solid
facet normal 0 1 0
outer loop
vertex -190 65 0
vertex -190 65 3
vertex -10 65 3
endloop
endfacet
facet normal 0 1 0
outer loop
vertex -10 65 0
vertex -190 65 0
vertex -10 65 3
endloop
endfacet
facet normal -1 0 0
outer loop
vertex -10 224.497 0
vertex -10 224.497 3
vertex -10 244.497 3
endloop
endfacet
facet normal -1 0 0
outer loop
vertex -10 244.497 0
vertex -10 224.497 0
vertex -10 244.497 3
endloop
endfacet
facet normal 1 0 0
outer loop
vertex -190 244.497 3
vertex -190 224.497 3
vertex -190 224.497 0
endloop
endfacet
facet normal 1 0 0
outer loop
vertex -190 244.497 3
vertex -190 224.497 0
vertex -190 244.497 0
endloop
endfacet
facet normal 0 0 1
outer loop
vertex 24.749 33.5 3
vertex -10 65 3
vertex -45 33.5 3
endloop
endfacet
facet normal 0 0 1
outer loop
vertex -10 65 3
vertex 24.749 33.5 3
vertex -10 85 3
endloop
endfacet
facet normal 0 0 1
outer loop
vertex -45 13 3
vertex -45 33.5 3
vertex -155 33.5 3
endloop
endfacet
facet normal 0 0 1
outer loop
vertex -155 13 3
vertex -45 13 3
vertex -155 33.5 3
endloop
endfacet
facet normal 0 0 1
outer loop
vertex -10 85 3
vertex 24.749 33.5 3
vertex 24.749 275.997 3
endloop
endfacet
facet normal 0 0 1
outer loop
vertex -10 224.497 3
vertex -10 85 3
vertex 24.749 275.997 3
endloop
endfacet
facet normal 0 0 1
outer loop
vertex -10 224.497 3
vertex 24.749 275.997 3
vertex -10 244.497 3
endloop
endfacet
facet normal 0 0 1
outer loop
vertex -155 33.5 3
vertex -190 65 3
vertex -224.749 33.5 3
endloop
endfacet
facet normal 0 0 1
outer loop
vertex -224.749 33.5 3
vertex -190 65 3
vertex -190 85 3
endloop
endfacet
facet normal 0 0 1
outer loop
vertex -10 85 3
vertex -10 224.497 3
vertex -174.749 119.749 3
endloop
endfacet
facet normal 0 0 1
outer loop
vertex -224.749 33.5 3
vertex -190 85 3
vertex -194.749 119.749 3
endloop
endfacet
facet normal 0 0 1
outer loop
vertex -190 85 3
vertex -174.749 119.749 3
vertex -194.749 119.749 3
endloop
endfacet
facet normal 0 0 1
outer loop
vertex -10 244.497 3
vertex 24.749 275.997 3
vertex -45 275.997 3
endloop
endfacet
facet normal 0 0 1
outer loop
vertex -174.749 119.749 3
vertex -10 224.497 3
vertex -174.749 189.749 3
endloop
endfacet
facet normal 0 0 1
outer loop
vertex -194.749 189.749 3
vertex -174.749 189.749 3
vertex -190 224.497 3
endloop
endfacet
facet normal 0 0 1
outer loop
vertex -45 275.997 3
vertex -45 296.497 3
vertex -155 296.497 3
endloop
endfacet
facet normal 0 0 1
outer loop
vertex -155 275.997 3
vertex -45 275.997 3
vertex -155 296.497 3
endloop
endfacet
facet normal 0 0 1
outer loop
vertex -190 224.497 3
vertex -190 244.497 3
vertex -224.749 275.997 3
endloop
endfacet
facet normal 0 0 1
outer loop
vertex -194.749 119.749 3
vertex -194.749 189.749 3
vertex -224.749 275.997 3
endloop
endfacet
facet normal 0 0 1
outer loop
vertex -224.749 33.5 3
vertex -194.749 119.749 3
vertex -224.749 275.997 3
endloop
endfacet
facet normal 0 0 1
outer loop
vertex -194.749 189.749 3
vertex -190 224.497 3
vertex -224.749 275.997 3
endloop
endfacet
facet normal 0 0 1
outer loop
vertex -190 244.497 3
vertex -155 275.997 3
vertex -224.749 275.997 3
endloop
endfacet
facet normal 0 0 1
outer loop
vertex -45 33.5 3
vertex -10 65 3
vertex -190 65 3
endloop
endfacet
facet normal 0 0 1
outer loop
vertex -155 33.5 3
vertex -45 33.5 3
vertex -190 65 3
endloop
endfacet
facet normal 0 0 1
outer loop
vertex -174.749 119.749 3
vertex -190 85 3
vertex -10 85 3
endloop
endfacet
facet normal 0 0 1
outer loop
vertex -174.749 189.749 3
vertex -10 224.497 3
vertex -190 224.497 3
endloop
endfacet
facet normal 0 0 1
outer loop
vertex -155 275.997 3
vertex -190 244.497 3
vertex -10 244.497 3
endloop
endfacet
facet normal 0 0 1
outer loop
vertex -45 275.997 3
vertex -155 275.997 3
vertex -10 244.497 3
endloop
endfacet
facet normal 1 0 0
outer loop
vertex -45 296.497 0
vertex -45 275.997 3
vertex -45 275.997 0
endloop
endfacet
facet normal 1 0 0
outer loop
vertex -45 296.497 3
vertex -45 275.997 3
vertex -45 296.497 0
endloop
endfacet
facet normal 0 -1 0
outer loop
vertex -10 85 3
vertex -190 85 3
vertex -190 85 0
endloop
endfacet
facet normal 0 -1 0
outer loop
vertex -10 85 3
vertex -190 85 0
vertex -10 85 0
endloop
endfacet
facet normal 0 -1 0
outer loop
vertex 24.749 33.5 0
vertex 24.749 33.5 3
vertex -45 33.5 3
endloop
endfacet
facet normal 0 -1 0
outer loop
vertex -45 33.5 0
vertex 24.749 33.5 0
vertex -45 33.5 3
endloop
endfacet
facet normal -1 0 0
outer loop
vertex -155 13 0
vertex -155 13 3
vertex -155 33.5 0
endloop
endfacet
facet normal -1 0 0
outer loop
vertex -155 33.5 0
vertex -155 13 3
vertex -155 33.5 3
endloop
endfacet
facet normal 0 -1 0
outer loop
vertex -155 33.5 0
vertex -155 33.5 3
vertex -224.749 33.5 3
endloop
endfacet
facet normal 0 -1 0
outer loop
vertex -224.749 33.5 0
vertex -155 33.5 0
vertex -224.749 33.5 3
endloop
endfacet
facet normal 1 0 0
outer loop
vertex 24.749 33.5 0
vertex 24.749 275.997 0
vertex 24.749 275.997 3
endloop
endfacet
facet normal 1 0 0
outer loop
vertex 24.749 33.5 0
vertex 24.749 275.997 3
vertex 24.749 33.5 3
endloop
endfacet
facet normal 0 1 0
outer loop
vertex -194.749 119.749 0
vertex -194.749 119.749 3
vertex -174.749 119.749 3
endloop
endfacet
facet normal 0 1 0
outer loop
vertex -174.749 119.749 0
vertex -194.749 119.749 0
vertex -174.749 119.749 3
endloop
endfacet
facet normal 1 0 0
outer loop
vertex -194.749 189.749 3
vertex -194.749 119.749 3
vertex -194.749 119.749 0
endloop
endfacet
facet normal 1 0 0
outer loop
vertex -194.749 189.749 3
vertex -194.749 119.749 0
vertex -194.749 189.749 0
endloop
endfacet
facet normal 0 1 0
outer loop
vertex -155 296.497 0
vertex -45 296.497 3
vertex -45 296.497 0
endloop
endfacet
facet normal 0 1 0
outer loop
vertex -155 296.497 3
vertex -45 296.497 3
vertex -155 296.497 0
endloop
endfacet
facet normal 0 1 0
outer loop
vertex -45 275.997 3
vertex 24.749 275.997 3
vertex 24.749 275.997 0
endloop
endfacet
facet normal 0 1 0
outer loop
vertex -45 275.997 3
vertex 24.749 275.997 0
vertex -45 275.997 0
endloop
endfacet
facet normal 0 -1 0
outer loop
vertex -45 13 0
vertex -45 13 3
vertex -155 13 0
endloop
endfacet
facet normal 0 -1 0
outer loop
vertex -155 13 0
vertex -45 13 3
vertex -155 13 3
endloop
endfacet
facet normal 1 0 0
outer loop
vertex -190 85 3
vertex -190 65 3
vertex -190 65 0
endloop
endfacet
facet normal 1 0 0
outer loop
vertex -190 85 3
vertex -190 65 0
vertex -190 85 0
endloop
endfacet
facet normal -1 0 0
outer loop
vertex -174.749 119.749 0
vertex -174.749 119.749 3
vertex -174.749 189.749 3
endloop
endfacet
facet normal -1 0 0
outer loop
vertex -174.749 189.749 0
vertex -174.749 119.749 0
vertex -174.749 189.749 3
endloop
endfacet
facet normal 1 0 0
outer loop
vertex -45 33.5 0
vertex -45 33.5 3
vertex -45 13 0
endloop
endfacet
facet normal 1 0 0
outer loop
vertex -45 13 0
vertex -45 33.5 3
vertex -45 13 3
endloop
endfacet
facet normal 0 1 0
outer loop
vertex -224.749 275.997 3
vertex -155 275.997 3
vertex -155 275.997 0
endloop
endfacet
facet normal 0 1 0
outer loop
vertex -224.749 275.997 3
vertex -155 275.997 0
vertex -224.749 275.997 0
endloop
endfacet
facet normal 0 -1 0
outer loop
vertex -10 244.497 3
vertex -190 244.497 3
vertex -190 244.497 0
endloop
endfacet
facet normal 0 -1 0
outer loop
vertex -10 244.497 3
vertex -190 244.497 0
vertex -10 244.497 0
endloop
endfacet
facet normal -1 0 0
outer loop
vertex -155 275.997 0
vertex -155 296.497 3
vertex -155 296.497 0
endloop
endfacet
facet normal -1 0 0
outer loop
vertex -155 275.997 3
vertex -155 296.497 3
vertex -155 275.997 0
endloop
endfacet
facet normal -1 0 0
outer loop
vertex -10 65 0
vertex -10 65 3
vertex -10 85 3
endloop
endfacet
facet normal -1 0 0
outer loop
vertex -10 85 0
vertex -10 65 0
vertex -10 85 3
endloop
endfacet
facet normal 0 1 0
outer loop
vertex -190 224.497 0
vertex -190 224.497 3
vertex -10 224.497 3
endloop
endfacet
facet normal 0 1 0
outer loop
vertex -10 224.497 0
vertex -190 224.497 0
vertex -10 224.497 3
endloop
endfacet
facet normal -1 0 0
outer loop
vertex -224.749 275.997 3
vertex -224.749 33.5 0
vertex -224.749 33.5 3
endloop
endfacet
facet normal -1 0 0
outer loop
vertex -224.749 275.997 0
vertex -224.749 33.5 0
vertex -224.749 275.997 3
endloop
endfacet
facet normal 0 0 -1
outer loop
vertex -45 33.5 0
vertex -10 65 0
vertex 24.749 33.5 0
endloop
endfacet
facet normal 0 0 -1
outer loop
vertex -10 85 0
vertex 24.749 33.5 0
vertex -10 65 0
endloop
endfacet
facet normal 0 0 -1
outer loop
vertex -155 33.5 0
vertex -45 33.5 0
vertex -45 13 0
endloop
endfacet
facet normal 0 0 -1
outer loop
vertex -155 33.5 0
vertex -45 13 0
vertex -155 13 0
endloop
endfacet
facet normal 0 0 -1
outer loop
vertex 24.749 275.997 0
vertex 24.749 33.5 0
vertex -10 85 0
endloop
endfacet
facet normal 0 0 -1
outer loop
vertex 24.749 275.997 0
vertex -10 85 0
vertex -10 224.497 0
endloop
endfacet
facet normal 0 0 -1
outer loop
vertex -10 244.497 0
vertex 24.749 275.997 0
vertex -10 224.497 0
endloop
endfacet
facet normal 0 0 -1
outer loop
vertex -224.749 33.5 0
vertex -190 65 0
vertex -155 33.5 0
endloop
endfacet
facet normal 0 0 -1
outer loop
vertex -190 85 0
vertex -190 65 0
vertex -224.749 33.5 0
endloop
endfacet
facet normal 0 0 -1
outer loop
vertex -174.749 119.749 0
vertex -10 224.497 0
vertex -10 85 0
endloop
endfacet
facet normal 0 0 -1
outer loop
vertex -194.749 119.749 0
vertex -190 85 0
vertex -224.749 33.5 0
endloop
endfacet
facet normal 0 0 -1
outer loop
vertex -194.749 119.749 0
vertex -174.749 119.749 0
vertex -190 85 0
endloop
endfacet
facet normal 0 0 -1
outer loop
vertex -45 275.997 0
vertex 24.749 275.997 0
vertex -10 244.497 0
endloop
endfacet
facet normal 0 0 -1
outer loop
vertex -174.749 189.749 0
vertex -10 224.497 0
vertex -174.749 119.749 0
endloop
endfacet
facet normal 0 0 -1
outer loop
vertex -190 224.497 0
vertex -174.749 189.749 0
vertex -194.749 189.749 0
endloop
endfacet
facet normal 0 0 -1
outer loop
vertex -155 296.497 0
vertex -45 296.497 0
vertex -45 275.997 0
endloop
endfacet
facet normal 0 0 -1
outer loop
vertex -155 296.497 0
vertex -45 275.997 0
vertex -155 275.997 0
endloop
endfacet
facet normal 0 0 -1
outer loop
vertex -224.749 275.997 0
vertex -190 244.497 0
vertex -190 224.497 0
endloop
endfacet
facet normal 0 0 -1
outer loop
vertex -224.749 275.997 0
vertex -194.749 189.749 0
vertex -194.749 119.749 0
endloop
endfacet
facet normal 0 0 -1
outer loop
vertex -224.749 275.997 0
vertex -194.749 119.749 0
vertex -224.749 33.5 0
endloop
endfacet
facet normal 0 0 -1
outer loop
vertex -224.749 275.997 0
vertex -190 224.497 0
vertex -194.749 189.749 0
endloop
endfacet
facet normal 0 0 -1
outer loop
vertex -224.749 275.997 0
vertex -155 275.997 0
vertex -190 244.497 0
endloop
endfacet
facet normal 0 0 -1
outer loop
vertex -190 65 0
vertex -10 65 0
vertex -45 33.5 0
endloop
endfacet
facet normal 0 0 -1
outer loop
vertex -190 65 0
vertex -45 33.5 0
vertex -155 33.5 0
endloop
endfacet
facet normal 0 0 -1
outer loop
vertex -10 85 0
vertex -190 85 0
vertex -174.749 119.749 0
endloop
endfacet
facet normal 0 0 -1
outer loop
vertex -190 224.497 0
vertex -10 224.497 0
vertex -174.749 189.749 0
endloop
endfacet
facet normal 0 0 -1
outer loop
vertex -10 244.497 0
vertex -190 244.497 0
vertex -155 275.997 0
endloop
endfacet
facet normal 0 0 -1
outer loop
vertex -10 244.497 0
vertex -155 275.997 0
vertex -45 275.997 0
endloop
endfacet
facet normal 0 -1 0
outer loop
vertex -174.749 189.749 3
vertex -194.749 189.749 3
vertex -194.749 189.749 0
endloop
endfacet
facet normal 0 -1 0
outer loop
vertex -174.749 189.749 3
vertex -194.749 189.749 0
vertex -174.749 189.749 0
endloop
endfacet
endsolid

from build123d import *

# Parameters (mm, degrees)
BASE_DEPTH              = 3
PROFIL_S_DEPTH          = 3
ESQUISSE3_W             = 180
ESQUISSE3_H             = 20
ESQUISSE3_W_2           = 20
ESQUISSE3_H_2           = 70
ENL_V_MAT_EXTRU_1_DEPTH = 3


with BuildPart() as part:
    # Esquisse1 → Base (new body)
    with BuildSketch(Plane.XY):
        Polygon((0, 0), (-200, 0), (-224.748737342, 24.748737342), (-224.748737342, 284.748737342), (-200, 309.497474683), (0, 309.497474683), (24.748737342, 284.748737342), (24.748737342, 24.748737342), align=None)
    extrude(amount=BASE_DEPTH)

    # Esquisse2 → profilés (cut)
    with BuildSketch(Plane.XY.offset(3)):
        Polygon((-45, 13), (-155, 13), (-155, 33.5), (-224.748737342, 33.5), (-224.748737342, 0), (24.748737342, 0), (24.748737342, 33.5), (-45, 33.5), align=None)
        Polygon((24.748737342, 309.497474683), (24.748737342, 275.997474683), (-45, 275.997474683), (-45, 296.497474683), (-155, 296.497474683), (-155, 275.997474683), (-224.748737342, 275.997474683), (-224.748737342, 309.497474683), align=None)
    extrude(amount=-PROFIL_S_DEPTH, mode=Mode.SUBTRACT)

    # Esquisse3 → Enlèv. mat.-Extru.1 (cut)
    with BuildSketch(Plane.XY.offset(3)):
        with Locations((-100, 234.497474683)):
            Rectangle(ESQUISSE3_W, ESQUISSE3_H)
        with Locations((-100, 75)):
            Rectangle(ESQUISSE3_W, ESQUISSE3_H)
        with Locations((-184.748737342, 154.748737342)):
            Rectangle(ESQUISSE3_W_2, ESQUISSE3_H_2)
    extrude(amount=-ENL_V_MAT_EXTRU_1_DEPTH, mode=Mode.SUBTRACT)


solid = part.part
